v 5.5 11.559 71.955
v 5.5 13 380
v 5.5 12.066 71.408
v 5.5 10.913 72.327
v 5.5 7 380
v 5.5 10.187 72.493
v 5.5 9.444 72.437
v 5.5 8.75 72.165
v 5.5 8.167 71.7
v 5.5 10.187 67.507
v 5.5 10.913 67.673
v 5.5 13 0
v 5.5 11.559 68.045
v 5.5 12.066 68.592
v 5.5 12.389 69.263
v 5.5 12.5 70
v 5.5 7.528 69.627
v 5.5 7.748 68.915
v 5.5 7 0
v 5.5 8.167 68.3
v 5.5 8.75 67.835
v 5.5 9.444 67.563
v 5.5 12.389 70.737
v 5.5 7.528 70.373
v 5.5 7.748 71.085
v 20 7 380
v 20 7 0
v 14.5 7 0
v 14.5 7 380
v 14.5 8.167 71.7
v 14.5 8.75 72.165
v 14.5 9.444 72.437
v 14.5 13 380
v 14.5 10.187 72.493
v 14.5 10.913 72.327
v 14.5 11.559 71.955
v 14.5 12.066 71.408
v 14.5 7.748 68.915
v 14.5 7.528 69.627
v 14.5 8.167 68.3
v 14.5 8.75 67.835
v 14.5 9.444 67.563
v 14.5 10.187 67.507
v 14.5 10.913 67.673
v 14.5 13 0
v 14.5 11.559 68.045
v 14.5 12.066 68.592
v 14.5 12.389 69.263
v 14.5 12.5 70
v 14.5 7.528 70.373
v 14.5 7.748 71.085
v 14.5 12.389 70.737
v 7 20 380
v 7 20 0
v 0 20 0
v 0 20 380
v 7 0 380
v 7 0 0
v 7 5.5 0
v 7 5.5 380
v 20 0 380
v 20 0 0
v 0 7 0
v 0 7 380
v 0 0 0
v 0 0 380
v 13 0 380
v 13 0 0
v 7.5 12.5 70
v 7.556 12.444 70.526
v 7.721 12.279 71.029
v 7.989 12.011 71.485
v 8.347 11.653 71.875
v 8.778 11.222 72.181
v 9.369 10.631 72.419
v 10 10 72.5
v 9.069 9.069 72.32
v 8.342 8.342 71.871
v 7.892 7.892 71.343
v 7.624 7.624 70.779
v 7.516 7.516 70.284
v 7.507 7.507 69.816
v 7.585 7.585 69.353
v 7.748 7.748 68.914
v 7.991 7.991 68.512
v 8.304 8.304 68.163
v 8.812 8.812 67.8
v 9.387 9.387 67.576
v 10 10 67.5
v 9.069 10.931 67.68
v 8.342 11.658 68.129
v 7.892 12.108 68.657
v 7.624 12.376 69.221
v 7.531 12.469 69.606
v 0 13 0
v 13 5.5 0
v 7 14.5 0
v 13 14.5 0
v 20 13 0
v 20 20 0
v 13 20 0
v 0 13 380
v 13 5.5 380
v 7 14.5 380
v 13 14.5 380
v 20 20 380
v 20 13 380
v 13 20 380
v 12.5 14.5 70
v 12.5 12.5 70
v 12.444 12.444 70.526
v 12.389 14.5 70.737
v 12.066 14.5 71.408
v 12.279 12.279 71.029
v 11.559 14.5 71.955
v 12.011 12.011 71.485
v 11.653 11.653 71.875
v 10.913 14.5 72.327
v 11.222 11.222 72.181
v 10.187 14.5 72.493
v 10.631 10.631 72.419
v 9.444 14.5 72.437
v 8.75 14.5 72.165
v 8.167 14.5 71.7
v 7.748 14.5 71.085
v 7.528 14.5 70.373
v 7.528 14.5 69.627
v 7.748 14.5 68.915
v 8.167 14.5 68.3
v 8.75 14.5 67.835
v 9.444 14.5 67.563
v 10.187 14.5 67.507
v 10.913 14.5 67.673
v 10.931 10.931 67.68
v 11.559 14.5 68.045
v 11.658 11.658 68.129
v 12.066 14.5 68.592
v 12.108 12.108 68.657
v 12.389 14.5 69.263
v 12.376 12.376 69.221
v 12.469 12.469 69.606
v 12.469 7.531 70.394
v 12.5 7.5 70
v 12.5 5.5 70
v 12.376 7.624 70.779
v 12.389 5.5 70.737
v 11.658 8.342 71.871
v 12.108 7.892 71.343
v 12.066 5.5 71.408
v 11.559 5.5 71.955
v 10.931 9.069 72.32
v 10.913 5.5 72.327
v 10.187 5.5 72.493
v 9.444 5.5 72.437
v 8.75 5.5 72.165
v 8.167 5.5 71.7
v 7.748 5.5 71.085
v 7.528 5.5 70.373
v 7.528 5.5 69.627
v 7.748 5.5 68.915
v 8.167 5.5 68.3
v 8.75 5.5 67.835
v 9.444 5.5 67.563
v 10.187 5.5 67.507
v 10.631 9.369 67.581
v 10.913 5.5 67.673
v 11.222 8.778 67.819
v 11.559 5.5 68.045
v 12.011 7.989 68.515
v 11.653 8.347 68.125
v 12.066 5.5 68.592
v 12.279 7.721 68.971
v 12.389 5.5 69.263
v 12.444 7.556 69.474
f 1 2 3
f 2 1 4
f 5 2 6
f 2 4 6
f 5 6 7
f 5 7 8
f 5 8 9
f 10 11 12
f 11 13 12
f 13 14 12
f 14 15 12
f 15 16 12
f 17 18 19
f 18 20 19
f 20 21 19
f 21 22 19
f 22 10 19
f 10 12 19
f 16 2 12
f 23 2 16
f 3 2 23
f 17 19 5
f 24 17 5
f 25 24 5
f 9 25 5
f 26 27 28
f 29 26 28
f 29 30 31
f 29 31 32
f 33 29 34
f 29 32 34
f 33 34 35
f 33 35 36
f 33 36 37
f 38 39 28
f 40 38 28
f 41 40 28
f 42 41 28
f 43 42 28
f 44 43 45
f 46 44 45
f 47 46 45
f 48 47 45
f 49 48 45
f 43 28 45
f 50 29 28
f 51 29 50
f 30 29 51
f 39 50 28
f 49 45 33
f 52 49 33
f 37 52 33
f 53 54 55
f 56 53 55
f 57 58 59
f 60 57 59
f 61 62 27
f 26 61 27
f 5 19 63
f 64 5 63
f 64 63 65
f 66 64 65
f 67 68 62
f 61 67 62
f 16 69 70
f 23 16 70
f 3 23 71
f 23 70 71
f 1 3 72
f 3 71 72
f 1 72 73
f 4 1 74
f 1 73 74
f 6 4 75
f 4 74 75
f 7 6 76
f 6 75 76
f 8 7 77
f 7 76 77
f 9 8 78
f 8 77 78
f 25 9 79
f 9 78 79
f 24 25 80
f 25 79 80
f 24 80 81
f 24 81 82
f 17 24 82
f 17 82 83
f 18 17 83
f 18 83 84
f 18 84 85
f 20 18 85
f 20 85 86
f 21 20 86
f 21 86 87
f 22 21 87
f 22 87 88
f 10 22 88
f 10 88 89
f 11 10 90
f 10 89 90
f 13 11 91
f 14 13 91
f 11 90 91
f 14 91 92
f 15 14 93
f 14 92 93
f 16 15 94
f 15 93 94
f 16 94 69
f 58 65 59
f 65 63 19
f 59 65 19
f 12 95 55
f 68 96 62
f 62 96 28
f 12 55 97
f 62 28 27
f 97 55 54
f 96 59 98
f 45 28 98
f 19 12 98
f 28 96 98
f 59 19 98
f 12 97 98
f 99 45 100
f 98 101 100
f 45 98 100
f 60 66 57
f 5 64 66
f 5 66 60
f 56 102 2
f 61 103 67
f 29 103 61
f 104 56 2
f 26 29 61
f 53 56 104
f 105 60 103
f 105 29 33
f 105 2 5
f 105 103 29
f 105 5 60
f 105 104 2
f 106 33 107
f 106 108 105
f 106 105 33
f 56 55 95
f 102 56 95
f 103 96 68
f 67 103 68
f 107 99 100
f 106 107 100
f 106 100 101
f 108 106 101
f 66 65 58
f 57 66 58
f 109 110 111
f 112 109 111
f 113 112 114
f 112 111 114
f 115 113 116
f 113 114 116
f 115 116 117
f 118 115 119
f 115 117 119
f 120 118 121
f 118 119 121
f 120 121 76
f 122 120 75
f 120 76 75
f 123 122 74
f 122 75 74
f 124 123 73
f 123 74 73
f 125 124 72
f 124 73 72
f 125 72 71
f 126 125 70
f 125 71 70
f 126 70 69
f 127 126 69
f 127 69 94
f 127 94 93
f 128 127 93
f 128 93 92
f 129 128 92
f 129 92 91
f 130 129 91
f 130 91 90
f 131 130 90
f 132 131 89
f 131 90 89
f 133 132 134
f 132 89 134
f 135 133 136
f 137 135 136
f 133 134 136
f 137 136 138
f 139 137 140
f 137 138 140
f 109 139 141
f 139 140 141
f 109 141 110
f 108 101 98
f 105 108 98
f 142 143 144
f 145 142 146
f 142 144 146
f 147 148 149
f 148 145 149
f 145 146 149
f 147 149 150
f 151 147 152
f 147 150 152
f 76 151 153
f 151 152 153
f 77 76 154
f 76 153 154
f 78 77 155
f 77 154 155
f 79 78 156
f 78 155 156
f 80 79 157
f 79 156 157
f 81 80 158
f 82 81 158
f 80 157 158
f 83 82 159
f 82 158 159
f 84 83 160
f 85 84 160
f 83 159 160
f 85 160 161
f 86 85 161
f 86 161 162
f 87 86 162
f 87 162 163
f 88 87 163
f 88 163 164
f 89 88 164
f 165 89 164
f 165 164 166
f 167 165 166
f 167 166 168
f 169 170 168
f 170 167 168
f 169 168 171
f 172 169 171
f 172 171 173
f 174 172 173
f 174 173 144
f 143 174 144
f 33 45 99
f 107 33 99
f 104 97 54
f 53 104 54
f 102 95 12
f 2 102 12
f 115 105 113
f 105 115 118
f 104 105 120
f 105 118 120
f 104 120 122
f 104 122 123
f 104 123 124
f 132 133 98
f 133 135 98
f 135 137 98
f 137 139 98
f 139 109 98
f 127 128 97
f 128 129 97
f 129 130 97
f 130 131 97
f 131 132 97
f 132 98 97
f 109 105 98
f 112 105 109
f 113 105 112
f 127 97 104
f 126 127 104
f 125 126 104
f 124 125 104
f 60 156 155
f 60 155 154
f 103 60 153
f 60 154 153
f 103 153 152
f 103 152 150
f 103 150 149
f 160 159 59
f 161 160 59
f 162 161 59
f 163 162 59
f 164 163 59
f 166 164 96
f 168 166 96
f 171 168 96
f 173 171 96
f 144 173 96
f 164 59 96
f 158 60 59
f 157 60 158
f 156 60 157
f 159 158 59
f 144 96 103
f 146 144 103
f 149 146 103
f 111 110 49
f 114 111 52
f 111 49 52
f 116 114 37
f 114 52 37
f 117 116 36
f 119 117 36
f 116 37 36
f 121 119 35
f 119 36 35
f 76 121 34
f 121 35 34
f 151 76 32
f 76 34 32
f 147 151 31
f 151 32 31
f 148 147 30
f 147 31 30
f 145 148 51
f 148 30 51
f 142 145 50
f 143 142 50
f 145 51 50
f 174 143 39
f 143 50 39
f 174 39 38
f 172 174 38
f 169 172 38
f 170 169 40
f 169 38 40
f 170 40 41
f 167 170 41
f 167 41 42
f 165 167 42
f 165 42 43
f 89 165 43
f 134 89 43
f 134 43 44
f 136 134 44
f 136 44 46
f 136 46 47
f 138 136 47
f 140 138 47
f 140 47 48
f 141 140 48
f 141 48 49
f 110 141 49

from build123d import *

# Parameters (mm, degrees)
F1_DEPTH = 380
F2_R     = 2.5
F3_DEPTH = 25
F4_R     = 2.5
F5_DEPTH = 25


with BuildPart() as f1:
    # F0 (on Top) → F1 (new body)
    with BuildSketch(Plane.XY):
        Polygon((0, 7), (0, 0), (7, 0), (7, 5.5), (13, 5.5), (13, 0), (20, 0), (20, 7), (14.5, 7), (14.5, 13), (20, 13), (20, 20), (13, 20), (13, 14.5), (7, 14.5), (7, 20), (0, 20), (0, 13), (5.5, 13), (5.5, 7), align=None)
    extrude(amount=F1_DEPTH)

    # F2 (on face) → F3 (cut)
    with BuildSketch(Plane.YZ.offset(14.5)):
        with Locations((10, 70)):
            Circle(F2_R)
    extrude(amount=-F3_DEPTH, mode=Mode.SUBTRACT)

    # F4 (on face) → F5 (cut)
    with BuildSketch(Plane.XZ.offset(-5.5)):
        with Locations((10, 70)):
            Circle(F4_R)
    extrude(amount=-F5_DEPTH, mode=Mode.SUBTRACT)


solid = f1.part
